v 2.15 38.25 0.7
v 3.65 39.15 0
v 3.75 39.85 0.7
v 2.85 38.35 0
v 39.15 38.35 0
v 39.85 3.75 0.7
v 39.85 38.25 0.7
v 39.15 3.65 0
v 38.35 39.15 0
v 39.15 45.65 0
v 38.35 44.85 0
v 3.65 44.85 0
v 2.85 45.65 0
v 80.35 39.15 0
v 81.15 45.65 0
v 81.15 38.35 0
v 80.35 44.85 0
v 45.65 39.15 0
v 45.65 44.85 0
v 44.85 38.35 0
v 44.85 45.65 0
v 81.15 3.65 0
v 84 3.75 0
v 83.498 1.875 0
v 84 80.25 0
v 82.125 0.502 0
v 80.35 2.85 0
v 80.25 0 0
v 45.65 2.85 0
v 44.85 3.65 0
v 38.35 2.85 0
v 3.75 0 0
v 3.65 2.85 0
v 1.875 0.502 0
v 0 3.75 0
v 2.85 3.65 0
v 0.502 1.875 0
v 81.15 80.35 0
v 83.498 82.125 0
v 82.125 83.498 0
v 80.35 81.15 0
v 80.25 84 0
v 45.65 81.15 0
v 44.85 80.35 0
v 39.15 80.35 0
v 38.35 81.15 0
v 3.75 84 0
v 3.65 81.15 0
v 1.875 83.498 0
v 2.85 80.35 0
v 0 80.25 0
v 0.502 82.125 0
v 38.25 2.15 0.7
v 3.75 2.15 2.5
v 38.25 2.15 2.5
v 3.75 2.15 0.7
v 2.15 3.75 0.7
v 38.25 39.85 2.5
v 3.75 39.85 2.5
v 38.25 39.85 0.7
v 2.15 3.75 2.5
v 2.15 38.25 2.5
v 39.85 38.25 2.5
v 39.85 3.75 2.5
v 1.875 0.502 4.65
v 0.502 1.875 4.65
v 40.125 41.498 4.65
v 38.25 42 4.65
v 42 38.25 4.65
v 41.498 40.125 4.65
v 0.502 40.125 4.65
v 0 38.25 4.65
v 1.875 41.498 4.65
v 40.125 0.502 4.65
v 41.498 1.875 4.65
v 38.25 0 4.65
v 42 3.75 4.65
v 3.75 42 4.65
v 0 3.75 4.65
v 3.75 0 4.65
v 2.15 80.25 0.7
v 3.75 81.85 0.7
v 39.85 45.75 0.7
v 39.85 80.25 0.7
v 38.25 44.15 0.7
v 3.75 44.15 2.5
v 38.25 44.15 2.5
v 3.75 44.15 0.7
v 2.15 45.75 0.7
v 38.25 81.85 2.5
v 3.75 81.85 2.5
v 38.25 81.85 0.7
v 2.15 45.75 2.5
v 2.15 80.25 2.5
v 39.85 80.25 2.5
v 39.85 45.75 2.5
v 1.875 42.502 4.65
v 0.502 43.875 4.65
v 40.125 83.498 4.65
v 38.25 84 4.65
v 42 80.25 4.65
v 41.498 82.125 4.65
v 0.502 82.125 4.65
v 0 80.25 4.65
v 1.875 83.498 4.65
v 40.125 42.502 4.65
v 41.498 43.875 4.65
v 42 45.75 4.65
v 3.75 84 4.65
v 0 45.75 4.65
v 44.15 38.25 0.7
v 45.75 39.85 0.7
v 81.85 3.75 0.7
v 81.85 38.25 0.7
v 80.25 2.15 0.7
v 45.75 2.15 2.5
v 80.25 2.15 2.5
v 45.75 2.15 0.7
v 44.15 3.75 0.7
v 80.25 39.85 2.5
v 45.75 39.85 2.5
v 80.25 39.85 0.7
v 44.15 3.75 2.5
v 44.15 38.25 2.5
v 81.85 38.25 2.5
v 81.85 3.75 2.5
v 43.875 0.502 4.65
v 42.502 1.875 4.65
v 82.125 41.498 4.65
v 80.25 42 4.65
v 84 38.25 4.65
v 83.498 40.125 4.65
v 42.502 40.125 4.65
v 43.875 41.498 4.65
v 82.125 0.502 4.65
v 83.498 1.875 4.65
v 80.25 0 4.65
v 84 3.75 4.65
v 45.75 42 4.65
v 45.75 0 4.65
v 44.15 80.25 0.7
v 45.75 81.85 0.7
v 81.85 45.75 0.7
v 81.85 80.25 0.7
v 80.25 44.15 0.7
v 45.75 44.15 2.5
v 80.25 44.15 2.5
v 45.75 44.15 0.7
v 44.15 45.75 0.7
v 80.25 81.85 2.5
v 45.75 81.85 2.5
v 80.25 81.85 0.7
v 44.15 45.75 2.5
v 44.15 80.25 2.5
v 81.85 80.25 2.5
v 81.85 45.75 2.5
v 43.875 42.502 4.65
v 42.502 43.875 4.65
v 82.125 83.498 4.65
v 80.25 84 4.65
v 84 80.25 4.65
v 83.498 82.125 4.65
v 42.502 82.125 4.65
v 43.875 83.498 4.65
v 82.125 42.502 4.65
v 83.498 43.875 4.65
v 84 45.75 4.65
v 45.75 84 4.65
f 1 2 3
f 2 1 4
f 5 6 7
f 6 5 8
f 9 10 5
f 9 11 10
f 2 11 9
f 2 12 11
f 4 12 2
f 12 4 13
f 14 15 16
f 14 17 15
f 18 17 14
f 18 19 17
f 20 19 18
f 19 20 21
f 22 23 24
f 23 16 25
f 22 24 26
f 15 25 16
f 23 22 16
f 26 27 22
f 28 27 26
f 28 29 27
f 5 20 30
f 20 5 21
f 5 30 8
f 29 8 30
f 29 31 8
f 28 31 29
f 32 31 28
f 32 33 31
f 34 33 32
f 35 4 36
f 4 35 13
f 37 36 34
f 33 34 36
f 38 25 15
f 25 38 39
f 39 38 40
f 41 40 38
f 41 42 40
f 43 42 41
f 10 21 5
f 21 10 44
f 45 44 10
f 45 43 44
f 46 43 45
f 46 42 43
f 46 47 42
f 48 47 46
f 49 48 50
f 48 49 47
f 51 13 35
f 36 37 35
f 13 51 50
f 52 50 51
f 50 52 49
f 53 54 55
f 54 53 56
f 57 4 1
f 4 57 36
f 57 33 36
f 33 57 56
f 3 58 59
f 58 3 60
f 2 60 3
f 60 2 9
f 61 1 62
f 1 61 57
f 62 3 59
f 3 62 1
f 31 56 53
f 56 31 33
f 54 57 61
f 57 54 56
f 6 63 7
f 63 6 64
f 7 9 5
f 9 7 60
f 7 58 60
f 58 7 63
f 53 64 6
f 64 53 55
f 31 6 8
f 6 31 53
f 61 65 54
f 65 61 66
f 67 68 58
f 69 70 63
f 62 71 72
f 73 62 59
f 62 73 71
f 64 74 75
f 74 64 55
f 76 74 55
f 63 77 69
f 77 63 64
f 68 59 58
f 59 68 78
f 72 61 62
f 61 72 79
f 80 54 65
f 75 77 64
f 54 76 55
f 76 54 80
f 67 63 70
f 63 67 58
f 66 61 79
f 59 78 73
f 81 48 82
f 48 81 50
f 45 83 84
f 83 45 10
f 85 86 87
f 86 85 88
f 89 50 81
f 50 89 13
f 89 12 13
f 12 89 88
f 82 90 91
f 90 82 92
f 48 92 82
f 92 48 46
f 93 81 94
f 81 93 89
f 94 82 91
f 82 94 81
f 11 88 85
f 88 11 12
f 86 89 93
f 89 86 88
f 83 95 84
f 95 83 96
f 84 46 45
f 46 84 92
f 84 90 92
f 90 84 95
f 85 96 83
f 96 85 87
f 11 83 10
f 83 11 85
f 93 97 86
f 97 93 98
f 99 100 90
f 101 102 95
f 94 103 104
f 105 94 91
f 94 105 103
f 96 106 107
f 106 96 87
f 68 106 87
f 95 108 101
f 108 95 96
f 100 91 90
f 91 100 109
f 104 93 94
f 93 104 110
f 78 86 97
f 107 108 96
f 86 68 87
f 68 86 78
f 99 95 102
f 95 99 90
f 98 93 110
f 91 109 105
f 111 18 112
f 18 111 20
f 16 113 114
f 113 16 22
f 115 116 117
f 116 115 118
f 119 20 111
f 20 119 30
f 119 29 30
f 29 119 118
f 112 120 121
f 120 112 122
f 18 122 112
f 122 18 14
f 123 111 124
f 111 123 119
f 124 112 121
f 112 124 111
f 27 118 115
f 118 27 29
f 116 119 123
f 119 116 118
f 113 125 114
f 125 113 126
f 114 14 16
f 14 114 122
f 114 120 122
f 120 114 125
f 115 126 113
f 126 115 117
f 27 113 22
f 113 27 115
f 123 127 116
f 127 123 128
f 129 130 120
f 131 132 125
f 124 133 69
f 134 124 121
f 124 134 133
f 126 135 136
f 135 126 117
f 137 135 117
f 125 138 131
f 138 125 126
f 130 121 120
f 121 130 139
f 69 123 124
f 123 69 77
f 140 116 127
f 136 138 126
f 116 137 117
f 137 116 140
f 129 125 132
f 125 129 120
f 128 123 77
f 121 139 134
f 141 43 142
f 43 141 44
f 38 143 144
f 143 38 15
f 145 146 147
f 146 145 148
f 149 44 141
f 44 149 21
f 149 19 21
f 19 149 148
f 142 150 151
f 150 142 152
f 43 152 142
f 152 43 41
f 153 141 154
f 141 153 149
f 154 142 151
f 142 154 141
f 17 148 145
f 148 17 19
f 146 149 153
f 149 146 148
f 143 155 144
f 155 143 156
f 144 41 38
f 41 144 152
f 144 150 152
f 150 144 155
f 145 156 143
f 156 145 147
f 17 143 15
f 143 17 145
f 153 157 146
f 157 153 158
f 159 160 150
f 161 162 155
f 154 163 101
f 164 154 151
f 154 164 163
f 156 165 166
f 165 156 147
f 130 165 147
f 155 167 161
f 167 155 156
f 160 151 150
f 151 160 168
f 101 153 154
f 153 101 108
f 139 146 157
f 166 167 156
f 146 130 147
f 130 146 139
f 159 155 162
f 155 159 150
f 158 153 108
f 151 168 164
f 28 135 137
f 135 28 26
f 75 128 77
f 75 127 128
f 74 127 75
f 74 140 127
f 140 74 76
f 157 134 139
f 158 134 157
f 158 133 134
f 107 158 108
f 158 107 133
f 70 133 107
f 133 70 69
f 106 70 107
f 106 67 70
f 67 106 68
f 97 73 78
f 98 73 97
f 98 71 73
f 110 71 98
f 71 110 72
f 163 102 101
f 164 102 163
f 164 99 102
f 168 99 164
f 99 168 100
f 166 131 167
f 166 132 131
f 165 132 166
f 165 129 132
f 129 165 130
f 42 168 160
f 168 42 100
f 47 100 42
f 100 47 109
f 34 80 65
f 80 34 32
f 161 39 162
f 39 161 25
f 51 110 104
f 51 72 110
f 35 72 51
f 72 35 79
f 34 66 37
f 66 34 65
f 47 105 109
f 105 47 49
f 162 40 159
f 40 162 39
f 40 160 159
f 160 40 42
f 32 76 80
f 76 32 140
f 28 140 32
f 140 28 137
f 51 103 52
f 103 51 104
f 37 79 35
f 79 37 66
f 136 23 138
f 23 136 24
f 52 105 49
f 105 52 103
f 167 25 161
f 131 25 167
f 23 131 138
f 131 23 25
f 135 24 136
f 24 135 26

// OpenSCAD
// Gridfinity-compatible baseplate for organizing modular storage bins
grid_x = 2; // [1:1:20]
grid_y = 2; // [1:1:20]
grid_unit = 42; // [40:0.5:44]

/* Gridfinity spec constants */
chamfer_top = 2.15;
wall_section = 1.8;
chamfer_bottom = 0.7;
corner_r_top = 7.5 / 2;    // 3.75mm — top opening
corner_r_mid = 3.2 / 2;    // 1.6mm  — vertical wall
corner_r_bot = 1.6 / 2;    // 0.8mm  — bottom

/* Derived dimensions */
total_height = chamfer_top + wall_section + chamfer_bottom;

top_opening = grid_unit;
inner_width = top_opening - 2 * chamfer_top;
bottom_width = inner_width - 2 * chamfer_bottom;

plate_x = grid_x * grid_unit;
plate_y = grid_y * grid_unit;

module rounded_square(size, r) {
    offset(r) offset(-r) square([size, size], center=true);
}

module rounded_rect(w, h, r) {
    offset(r) offset(-r) square([w, h], center=true);
}

module pocket() {
    z0 = 0;
    z1 = chamfer_bottom;
    z2 = z1 + wall_section;
    z3 = z2 + chamfer_top;

    // Bottom chamfer
    hull() {
        translate([0, 0, z0])
            linear_extrude(0.01)
                rounded_square(bottom_width, corner_r_bot);
        translate([0, 0, z1])
            linear_extrude(0.01)
                rounded_square(inner_width, corner_r_mid);
    }

    // Vertical wall
    translate([0, 0, z1])
        linear_extrude(wall_section)
            rounded_square(inner_width, corner_r_mid);

    // Top chamfer
    hull() {
        translate([0, 0, z2])
            linear_extrude(0.01)
                rounded_square(inner_width, corner_r_mid);
        translate([0, 0, z3])
            linear_extrude(0.01)
                rounded_square(top_opening, corner_r_top);
    }
}

difference() {
    translate([plate_x / 2, plate_y / 2, 0])
        linear_extrude(total_height)
            rounded_rect(plate_x, plate_y, corner_r_top);

    for (ix = [0 : grid_x - 1]) {
        for (iy = [0 : grid_y - 1]) {
            translate([
                ix * grid_unit + grid_unit / 2,
                iy * grid_unit + grid_unit / 2,
                0
            ])
                pocket();
        }
    }
}
